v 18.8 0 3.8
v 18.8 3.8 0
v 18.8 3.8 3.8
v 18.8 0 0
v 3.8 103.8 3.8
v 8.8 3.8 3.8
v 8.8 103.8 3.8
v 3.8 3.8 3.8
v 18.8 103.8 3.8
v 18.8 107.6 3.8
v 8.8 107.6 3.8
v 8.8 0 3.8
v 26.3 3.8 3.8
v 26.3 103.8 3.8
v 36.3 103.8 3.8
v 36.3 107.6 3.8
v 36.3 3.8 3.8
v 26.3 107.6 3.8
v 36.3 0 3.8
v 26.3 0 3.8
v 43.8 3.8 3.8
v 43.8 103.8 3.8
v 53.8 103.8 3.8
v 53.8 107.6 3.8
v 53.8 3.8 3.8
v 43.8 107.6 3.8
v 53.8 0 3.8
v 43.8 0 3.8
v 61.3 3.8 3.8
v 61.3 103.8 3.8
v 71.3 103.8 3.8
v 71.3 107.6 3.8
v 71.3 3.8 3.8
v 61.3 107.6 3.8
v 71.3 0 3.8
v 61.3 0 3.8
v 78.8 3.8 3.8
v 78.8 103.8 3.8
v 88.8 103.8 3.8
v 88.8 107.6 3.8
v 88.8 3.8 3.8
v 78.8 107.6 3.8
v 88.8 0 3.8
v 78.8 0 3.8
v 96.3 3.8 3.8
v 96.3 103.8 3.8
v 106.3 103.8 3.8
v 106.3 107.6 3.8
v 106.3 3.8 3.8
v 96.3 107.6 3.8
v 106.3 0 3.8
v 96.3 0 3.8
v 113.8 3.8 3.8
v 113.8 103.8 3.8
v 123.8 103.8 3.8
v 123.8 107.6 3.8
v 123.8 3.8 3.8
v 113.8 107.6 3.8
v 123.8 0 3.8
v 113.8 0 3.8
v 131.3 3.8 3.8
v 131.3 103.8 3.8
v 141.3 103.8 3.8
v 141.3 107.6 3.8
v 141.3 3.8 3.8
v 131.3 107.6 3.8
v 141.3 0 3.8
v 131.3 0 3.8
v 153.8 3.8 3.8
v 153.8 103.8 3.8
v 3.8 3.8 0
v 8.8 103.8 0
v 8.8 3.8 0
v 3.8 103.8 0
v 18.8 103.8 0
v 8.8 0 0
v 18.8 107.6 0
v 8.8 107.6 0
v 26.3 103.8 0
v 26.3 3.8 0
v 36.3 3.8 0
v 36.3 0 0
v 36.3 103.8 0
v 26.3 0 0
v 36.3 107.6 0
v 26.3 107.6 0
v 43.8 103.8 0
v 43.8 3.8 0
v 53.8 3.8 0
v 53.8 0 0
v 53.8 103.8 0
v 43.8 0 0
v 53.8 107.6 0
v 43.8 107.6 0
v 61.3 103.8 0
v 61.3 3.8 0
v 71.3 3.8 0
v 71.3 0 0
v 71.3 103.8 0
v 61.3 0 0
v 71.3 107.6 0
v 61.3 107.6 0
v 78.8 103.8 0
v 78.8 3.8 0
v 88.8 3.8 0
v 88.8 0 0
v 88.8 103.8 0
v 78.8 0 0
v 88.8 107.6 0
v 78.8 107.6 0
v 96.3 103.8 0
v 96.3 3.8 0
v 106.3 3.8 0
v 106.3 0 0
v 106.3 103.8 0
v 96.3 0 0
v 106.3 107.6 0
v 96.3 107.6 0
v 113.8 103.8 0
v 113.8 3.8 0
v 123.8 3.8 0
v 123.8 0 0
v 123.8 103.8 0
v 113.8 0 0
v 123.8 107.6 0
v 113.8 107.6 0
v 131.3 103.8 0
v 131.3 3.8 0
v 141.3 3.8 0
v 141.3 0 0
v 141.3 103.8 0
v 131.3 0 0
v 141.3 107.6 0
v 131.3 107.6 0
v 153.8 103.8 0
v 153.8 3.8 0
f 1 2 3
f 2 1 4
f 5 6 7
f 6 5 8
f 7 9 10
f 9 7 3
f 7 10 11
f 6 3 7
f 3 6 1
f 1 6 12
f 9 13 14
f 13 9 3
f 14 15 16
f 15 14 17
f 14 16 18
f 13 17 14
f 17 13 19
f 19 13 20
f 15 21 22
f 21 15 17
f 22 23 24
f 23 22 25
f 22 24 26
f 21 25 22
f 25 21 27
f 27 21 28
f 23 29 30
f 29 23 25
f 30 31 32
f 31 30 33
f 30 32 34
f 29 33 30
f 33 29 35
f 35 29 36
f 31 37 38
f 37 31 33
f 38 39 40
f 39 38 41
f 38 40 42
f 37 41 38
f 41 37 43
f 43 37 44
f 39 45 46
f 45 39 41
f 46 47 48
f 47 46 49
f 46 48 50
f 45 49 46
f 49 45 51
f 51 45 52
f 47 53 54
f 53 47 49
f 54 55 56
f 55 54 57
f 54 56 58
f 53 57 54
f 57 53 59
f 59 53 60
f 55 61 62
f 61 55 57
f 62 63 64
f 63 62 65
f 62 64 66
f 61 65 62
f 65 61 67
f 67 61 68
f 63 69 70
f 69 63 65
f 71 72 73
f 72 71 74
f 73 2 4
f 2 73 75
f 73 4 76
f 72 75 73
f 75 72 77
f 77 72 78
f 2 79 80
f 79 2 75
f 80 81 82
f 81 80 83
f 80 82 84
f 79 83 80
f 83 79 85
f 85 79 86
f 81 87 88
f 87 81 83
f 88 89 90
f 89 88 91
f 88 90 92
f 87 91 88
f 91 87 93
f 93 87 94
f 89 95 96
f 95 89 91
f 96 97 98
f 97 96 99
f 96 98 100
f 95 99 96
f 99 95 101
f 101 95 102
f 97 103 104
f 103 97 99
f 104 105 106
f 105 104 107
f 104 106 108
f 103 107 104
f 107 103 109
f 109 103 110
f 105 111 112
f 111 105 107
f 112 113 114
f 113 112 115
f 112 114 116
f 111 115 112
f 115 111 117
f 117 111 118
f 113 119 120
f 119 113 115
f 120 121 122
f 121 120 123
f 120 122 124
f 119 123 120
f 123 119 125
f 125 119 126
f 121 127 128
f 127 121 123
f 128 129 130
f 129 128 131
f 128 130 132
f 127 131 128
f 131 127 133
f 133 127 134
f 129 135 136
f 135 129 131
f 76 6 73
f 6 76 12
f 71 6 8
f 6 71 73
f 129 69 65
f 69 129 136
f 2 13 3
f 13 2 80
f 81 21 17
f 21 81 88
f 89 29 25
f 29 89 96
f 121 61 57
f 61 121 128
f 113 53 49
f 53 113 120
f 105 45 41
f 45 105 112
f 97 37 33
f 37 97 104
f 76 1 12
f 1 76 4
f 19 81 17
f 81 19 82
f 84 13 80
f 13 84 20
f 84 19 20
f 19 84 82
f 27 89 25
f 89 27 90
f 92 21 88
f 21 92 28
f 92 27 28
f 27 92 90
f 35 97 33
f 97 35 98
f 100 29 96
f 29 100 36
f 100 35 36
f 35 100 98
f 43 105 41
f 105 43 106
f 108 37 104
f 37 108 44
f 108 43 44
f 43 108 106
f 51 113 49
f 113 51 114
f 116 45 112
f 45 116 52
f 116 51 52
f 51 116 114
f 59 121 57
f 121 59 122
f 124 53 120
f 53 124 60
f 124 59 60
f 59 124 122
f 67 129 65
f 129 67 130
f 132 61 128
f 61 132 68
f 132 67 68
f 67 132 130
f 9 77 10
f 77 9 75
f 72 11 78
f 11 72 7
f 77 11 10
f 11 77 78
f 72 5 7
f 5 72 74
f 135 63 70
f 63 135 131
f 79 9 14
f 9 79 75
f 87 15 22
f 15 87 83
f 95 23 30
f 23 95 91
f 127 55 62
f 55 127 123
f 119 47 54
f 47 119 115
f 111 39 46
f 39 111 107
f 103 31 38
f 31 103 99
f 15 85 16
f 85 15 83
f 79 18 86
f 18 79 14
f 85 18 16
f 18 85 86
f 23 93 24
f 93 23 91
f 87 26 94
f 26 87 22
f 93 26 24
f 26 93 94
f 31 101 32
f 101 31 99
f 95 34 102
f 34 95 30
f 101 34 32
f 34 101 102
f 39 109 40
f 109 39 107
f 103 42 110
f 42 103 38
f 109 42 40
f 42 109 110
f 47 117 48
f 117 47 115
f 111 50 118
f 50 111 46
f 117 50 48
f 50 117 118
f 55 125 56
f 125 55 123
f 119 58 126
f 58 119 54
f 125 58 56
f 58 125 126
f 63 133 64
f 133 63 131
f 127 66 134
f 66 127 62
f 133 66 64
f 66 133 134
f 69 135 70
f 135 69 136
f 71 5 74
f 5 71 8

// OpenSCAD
$slot_length_tab=10;
$slot_length_socket=10;

$material_depth=3.8;
$x_orient=1;
$y_orient=0;

$x_tab_count = 2;
$y_tab_count = 3;

function tab_position(index, side_len, tab_len, tab_count) =  
       (((side_len-tab_len)/tab_count) * index) + tab_len/2 ;

module add_tab(depth, length, x_orientation) {
    if (x_orientation) {
        cube([length, depth, depth]);
    } else {
        cube([depth, length, depth]);
    }
}

$tab_counter = 8;

module tab_flat(width, length, mat_depth) {

    union() {
        translate([mat_depth, mat_depth, 0]) {
            cube([width, length, mat_depth]);
        }
        for (index = [ 0 : $tab_counter-1]) {
            translate([mat_depth + tab_position(index, width, $slot_length_tab, $tab_counter),0,0]) {
                add_tab(mat_depth, $slot_length_tab, $x_orient);
            }
        }
        for (index = [ 0 : $tab_counter-1]) {
            translate([mat_depth + tab_position(index, width, $slot_length_tab, $tab_counter),length+mat_depth,0]) {
                add_tab(mat_depth, $slot_length_tab, $x_orient);
            }
        }
    }
}

module socket_flat(width, length, mat_depth) {
    
}

module make_box(width, length, heigh, mat_deptht) {
    
    
}


tab_flat(150, 100, $material_depth);



/*
translate([10, 0, 0]) {
    add_tab($material_depth, $slot_length_tab, $x_orient);
}
translate([30, 0, 0]) {
    add_tab($material_depth, $slot_length_tab, $x_orient);
}
*/
